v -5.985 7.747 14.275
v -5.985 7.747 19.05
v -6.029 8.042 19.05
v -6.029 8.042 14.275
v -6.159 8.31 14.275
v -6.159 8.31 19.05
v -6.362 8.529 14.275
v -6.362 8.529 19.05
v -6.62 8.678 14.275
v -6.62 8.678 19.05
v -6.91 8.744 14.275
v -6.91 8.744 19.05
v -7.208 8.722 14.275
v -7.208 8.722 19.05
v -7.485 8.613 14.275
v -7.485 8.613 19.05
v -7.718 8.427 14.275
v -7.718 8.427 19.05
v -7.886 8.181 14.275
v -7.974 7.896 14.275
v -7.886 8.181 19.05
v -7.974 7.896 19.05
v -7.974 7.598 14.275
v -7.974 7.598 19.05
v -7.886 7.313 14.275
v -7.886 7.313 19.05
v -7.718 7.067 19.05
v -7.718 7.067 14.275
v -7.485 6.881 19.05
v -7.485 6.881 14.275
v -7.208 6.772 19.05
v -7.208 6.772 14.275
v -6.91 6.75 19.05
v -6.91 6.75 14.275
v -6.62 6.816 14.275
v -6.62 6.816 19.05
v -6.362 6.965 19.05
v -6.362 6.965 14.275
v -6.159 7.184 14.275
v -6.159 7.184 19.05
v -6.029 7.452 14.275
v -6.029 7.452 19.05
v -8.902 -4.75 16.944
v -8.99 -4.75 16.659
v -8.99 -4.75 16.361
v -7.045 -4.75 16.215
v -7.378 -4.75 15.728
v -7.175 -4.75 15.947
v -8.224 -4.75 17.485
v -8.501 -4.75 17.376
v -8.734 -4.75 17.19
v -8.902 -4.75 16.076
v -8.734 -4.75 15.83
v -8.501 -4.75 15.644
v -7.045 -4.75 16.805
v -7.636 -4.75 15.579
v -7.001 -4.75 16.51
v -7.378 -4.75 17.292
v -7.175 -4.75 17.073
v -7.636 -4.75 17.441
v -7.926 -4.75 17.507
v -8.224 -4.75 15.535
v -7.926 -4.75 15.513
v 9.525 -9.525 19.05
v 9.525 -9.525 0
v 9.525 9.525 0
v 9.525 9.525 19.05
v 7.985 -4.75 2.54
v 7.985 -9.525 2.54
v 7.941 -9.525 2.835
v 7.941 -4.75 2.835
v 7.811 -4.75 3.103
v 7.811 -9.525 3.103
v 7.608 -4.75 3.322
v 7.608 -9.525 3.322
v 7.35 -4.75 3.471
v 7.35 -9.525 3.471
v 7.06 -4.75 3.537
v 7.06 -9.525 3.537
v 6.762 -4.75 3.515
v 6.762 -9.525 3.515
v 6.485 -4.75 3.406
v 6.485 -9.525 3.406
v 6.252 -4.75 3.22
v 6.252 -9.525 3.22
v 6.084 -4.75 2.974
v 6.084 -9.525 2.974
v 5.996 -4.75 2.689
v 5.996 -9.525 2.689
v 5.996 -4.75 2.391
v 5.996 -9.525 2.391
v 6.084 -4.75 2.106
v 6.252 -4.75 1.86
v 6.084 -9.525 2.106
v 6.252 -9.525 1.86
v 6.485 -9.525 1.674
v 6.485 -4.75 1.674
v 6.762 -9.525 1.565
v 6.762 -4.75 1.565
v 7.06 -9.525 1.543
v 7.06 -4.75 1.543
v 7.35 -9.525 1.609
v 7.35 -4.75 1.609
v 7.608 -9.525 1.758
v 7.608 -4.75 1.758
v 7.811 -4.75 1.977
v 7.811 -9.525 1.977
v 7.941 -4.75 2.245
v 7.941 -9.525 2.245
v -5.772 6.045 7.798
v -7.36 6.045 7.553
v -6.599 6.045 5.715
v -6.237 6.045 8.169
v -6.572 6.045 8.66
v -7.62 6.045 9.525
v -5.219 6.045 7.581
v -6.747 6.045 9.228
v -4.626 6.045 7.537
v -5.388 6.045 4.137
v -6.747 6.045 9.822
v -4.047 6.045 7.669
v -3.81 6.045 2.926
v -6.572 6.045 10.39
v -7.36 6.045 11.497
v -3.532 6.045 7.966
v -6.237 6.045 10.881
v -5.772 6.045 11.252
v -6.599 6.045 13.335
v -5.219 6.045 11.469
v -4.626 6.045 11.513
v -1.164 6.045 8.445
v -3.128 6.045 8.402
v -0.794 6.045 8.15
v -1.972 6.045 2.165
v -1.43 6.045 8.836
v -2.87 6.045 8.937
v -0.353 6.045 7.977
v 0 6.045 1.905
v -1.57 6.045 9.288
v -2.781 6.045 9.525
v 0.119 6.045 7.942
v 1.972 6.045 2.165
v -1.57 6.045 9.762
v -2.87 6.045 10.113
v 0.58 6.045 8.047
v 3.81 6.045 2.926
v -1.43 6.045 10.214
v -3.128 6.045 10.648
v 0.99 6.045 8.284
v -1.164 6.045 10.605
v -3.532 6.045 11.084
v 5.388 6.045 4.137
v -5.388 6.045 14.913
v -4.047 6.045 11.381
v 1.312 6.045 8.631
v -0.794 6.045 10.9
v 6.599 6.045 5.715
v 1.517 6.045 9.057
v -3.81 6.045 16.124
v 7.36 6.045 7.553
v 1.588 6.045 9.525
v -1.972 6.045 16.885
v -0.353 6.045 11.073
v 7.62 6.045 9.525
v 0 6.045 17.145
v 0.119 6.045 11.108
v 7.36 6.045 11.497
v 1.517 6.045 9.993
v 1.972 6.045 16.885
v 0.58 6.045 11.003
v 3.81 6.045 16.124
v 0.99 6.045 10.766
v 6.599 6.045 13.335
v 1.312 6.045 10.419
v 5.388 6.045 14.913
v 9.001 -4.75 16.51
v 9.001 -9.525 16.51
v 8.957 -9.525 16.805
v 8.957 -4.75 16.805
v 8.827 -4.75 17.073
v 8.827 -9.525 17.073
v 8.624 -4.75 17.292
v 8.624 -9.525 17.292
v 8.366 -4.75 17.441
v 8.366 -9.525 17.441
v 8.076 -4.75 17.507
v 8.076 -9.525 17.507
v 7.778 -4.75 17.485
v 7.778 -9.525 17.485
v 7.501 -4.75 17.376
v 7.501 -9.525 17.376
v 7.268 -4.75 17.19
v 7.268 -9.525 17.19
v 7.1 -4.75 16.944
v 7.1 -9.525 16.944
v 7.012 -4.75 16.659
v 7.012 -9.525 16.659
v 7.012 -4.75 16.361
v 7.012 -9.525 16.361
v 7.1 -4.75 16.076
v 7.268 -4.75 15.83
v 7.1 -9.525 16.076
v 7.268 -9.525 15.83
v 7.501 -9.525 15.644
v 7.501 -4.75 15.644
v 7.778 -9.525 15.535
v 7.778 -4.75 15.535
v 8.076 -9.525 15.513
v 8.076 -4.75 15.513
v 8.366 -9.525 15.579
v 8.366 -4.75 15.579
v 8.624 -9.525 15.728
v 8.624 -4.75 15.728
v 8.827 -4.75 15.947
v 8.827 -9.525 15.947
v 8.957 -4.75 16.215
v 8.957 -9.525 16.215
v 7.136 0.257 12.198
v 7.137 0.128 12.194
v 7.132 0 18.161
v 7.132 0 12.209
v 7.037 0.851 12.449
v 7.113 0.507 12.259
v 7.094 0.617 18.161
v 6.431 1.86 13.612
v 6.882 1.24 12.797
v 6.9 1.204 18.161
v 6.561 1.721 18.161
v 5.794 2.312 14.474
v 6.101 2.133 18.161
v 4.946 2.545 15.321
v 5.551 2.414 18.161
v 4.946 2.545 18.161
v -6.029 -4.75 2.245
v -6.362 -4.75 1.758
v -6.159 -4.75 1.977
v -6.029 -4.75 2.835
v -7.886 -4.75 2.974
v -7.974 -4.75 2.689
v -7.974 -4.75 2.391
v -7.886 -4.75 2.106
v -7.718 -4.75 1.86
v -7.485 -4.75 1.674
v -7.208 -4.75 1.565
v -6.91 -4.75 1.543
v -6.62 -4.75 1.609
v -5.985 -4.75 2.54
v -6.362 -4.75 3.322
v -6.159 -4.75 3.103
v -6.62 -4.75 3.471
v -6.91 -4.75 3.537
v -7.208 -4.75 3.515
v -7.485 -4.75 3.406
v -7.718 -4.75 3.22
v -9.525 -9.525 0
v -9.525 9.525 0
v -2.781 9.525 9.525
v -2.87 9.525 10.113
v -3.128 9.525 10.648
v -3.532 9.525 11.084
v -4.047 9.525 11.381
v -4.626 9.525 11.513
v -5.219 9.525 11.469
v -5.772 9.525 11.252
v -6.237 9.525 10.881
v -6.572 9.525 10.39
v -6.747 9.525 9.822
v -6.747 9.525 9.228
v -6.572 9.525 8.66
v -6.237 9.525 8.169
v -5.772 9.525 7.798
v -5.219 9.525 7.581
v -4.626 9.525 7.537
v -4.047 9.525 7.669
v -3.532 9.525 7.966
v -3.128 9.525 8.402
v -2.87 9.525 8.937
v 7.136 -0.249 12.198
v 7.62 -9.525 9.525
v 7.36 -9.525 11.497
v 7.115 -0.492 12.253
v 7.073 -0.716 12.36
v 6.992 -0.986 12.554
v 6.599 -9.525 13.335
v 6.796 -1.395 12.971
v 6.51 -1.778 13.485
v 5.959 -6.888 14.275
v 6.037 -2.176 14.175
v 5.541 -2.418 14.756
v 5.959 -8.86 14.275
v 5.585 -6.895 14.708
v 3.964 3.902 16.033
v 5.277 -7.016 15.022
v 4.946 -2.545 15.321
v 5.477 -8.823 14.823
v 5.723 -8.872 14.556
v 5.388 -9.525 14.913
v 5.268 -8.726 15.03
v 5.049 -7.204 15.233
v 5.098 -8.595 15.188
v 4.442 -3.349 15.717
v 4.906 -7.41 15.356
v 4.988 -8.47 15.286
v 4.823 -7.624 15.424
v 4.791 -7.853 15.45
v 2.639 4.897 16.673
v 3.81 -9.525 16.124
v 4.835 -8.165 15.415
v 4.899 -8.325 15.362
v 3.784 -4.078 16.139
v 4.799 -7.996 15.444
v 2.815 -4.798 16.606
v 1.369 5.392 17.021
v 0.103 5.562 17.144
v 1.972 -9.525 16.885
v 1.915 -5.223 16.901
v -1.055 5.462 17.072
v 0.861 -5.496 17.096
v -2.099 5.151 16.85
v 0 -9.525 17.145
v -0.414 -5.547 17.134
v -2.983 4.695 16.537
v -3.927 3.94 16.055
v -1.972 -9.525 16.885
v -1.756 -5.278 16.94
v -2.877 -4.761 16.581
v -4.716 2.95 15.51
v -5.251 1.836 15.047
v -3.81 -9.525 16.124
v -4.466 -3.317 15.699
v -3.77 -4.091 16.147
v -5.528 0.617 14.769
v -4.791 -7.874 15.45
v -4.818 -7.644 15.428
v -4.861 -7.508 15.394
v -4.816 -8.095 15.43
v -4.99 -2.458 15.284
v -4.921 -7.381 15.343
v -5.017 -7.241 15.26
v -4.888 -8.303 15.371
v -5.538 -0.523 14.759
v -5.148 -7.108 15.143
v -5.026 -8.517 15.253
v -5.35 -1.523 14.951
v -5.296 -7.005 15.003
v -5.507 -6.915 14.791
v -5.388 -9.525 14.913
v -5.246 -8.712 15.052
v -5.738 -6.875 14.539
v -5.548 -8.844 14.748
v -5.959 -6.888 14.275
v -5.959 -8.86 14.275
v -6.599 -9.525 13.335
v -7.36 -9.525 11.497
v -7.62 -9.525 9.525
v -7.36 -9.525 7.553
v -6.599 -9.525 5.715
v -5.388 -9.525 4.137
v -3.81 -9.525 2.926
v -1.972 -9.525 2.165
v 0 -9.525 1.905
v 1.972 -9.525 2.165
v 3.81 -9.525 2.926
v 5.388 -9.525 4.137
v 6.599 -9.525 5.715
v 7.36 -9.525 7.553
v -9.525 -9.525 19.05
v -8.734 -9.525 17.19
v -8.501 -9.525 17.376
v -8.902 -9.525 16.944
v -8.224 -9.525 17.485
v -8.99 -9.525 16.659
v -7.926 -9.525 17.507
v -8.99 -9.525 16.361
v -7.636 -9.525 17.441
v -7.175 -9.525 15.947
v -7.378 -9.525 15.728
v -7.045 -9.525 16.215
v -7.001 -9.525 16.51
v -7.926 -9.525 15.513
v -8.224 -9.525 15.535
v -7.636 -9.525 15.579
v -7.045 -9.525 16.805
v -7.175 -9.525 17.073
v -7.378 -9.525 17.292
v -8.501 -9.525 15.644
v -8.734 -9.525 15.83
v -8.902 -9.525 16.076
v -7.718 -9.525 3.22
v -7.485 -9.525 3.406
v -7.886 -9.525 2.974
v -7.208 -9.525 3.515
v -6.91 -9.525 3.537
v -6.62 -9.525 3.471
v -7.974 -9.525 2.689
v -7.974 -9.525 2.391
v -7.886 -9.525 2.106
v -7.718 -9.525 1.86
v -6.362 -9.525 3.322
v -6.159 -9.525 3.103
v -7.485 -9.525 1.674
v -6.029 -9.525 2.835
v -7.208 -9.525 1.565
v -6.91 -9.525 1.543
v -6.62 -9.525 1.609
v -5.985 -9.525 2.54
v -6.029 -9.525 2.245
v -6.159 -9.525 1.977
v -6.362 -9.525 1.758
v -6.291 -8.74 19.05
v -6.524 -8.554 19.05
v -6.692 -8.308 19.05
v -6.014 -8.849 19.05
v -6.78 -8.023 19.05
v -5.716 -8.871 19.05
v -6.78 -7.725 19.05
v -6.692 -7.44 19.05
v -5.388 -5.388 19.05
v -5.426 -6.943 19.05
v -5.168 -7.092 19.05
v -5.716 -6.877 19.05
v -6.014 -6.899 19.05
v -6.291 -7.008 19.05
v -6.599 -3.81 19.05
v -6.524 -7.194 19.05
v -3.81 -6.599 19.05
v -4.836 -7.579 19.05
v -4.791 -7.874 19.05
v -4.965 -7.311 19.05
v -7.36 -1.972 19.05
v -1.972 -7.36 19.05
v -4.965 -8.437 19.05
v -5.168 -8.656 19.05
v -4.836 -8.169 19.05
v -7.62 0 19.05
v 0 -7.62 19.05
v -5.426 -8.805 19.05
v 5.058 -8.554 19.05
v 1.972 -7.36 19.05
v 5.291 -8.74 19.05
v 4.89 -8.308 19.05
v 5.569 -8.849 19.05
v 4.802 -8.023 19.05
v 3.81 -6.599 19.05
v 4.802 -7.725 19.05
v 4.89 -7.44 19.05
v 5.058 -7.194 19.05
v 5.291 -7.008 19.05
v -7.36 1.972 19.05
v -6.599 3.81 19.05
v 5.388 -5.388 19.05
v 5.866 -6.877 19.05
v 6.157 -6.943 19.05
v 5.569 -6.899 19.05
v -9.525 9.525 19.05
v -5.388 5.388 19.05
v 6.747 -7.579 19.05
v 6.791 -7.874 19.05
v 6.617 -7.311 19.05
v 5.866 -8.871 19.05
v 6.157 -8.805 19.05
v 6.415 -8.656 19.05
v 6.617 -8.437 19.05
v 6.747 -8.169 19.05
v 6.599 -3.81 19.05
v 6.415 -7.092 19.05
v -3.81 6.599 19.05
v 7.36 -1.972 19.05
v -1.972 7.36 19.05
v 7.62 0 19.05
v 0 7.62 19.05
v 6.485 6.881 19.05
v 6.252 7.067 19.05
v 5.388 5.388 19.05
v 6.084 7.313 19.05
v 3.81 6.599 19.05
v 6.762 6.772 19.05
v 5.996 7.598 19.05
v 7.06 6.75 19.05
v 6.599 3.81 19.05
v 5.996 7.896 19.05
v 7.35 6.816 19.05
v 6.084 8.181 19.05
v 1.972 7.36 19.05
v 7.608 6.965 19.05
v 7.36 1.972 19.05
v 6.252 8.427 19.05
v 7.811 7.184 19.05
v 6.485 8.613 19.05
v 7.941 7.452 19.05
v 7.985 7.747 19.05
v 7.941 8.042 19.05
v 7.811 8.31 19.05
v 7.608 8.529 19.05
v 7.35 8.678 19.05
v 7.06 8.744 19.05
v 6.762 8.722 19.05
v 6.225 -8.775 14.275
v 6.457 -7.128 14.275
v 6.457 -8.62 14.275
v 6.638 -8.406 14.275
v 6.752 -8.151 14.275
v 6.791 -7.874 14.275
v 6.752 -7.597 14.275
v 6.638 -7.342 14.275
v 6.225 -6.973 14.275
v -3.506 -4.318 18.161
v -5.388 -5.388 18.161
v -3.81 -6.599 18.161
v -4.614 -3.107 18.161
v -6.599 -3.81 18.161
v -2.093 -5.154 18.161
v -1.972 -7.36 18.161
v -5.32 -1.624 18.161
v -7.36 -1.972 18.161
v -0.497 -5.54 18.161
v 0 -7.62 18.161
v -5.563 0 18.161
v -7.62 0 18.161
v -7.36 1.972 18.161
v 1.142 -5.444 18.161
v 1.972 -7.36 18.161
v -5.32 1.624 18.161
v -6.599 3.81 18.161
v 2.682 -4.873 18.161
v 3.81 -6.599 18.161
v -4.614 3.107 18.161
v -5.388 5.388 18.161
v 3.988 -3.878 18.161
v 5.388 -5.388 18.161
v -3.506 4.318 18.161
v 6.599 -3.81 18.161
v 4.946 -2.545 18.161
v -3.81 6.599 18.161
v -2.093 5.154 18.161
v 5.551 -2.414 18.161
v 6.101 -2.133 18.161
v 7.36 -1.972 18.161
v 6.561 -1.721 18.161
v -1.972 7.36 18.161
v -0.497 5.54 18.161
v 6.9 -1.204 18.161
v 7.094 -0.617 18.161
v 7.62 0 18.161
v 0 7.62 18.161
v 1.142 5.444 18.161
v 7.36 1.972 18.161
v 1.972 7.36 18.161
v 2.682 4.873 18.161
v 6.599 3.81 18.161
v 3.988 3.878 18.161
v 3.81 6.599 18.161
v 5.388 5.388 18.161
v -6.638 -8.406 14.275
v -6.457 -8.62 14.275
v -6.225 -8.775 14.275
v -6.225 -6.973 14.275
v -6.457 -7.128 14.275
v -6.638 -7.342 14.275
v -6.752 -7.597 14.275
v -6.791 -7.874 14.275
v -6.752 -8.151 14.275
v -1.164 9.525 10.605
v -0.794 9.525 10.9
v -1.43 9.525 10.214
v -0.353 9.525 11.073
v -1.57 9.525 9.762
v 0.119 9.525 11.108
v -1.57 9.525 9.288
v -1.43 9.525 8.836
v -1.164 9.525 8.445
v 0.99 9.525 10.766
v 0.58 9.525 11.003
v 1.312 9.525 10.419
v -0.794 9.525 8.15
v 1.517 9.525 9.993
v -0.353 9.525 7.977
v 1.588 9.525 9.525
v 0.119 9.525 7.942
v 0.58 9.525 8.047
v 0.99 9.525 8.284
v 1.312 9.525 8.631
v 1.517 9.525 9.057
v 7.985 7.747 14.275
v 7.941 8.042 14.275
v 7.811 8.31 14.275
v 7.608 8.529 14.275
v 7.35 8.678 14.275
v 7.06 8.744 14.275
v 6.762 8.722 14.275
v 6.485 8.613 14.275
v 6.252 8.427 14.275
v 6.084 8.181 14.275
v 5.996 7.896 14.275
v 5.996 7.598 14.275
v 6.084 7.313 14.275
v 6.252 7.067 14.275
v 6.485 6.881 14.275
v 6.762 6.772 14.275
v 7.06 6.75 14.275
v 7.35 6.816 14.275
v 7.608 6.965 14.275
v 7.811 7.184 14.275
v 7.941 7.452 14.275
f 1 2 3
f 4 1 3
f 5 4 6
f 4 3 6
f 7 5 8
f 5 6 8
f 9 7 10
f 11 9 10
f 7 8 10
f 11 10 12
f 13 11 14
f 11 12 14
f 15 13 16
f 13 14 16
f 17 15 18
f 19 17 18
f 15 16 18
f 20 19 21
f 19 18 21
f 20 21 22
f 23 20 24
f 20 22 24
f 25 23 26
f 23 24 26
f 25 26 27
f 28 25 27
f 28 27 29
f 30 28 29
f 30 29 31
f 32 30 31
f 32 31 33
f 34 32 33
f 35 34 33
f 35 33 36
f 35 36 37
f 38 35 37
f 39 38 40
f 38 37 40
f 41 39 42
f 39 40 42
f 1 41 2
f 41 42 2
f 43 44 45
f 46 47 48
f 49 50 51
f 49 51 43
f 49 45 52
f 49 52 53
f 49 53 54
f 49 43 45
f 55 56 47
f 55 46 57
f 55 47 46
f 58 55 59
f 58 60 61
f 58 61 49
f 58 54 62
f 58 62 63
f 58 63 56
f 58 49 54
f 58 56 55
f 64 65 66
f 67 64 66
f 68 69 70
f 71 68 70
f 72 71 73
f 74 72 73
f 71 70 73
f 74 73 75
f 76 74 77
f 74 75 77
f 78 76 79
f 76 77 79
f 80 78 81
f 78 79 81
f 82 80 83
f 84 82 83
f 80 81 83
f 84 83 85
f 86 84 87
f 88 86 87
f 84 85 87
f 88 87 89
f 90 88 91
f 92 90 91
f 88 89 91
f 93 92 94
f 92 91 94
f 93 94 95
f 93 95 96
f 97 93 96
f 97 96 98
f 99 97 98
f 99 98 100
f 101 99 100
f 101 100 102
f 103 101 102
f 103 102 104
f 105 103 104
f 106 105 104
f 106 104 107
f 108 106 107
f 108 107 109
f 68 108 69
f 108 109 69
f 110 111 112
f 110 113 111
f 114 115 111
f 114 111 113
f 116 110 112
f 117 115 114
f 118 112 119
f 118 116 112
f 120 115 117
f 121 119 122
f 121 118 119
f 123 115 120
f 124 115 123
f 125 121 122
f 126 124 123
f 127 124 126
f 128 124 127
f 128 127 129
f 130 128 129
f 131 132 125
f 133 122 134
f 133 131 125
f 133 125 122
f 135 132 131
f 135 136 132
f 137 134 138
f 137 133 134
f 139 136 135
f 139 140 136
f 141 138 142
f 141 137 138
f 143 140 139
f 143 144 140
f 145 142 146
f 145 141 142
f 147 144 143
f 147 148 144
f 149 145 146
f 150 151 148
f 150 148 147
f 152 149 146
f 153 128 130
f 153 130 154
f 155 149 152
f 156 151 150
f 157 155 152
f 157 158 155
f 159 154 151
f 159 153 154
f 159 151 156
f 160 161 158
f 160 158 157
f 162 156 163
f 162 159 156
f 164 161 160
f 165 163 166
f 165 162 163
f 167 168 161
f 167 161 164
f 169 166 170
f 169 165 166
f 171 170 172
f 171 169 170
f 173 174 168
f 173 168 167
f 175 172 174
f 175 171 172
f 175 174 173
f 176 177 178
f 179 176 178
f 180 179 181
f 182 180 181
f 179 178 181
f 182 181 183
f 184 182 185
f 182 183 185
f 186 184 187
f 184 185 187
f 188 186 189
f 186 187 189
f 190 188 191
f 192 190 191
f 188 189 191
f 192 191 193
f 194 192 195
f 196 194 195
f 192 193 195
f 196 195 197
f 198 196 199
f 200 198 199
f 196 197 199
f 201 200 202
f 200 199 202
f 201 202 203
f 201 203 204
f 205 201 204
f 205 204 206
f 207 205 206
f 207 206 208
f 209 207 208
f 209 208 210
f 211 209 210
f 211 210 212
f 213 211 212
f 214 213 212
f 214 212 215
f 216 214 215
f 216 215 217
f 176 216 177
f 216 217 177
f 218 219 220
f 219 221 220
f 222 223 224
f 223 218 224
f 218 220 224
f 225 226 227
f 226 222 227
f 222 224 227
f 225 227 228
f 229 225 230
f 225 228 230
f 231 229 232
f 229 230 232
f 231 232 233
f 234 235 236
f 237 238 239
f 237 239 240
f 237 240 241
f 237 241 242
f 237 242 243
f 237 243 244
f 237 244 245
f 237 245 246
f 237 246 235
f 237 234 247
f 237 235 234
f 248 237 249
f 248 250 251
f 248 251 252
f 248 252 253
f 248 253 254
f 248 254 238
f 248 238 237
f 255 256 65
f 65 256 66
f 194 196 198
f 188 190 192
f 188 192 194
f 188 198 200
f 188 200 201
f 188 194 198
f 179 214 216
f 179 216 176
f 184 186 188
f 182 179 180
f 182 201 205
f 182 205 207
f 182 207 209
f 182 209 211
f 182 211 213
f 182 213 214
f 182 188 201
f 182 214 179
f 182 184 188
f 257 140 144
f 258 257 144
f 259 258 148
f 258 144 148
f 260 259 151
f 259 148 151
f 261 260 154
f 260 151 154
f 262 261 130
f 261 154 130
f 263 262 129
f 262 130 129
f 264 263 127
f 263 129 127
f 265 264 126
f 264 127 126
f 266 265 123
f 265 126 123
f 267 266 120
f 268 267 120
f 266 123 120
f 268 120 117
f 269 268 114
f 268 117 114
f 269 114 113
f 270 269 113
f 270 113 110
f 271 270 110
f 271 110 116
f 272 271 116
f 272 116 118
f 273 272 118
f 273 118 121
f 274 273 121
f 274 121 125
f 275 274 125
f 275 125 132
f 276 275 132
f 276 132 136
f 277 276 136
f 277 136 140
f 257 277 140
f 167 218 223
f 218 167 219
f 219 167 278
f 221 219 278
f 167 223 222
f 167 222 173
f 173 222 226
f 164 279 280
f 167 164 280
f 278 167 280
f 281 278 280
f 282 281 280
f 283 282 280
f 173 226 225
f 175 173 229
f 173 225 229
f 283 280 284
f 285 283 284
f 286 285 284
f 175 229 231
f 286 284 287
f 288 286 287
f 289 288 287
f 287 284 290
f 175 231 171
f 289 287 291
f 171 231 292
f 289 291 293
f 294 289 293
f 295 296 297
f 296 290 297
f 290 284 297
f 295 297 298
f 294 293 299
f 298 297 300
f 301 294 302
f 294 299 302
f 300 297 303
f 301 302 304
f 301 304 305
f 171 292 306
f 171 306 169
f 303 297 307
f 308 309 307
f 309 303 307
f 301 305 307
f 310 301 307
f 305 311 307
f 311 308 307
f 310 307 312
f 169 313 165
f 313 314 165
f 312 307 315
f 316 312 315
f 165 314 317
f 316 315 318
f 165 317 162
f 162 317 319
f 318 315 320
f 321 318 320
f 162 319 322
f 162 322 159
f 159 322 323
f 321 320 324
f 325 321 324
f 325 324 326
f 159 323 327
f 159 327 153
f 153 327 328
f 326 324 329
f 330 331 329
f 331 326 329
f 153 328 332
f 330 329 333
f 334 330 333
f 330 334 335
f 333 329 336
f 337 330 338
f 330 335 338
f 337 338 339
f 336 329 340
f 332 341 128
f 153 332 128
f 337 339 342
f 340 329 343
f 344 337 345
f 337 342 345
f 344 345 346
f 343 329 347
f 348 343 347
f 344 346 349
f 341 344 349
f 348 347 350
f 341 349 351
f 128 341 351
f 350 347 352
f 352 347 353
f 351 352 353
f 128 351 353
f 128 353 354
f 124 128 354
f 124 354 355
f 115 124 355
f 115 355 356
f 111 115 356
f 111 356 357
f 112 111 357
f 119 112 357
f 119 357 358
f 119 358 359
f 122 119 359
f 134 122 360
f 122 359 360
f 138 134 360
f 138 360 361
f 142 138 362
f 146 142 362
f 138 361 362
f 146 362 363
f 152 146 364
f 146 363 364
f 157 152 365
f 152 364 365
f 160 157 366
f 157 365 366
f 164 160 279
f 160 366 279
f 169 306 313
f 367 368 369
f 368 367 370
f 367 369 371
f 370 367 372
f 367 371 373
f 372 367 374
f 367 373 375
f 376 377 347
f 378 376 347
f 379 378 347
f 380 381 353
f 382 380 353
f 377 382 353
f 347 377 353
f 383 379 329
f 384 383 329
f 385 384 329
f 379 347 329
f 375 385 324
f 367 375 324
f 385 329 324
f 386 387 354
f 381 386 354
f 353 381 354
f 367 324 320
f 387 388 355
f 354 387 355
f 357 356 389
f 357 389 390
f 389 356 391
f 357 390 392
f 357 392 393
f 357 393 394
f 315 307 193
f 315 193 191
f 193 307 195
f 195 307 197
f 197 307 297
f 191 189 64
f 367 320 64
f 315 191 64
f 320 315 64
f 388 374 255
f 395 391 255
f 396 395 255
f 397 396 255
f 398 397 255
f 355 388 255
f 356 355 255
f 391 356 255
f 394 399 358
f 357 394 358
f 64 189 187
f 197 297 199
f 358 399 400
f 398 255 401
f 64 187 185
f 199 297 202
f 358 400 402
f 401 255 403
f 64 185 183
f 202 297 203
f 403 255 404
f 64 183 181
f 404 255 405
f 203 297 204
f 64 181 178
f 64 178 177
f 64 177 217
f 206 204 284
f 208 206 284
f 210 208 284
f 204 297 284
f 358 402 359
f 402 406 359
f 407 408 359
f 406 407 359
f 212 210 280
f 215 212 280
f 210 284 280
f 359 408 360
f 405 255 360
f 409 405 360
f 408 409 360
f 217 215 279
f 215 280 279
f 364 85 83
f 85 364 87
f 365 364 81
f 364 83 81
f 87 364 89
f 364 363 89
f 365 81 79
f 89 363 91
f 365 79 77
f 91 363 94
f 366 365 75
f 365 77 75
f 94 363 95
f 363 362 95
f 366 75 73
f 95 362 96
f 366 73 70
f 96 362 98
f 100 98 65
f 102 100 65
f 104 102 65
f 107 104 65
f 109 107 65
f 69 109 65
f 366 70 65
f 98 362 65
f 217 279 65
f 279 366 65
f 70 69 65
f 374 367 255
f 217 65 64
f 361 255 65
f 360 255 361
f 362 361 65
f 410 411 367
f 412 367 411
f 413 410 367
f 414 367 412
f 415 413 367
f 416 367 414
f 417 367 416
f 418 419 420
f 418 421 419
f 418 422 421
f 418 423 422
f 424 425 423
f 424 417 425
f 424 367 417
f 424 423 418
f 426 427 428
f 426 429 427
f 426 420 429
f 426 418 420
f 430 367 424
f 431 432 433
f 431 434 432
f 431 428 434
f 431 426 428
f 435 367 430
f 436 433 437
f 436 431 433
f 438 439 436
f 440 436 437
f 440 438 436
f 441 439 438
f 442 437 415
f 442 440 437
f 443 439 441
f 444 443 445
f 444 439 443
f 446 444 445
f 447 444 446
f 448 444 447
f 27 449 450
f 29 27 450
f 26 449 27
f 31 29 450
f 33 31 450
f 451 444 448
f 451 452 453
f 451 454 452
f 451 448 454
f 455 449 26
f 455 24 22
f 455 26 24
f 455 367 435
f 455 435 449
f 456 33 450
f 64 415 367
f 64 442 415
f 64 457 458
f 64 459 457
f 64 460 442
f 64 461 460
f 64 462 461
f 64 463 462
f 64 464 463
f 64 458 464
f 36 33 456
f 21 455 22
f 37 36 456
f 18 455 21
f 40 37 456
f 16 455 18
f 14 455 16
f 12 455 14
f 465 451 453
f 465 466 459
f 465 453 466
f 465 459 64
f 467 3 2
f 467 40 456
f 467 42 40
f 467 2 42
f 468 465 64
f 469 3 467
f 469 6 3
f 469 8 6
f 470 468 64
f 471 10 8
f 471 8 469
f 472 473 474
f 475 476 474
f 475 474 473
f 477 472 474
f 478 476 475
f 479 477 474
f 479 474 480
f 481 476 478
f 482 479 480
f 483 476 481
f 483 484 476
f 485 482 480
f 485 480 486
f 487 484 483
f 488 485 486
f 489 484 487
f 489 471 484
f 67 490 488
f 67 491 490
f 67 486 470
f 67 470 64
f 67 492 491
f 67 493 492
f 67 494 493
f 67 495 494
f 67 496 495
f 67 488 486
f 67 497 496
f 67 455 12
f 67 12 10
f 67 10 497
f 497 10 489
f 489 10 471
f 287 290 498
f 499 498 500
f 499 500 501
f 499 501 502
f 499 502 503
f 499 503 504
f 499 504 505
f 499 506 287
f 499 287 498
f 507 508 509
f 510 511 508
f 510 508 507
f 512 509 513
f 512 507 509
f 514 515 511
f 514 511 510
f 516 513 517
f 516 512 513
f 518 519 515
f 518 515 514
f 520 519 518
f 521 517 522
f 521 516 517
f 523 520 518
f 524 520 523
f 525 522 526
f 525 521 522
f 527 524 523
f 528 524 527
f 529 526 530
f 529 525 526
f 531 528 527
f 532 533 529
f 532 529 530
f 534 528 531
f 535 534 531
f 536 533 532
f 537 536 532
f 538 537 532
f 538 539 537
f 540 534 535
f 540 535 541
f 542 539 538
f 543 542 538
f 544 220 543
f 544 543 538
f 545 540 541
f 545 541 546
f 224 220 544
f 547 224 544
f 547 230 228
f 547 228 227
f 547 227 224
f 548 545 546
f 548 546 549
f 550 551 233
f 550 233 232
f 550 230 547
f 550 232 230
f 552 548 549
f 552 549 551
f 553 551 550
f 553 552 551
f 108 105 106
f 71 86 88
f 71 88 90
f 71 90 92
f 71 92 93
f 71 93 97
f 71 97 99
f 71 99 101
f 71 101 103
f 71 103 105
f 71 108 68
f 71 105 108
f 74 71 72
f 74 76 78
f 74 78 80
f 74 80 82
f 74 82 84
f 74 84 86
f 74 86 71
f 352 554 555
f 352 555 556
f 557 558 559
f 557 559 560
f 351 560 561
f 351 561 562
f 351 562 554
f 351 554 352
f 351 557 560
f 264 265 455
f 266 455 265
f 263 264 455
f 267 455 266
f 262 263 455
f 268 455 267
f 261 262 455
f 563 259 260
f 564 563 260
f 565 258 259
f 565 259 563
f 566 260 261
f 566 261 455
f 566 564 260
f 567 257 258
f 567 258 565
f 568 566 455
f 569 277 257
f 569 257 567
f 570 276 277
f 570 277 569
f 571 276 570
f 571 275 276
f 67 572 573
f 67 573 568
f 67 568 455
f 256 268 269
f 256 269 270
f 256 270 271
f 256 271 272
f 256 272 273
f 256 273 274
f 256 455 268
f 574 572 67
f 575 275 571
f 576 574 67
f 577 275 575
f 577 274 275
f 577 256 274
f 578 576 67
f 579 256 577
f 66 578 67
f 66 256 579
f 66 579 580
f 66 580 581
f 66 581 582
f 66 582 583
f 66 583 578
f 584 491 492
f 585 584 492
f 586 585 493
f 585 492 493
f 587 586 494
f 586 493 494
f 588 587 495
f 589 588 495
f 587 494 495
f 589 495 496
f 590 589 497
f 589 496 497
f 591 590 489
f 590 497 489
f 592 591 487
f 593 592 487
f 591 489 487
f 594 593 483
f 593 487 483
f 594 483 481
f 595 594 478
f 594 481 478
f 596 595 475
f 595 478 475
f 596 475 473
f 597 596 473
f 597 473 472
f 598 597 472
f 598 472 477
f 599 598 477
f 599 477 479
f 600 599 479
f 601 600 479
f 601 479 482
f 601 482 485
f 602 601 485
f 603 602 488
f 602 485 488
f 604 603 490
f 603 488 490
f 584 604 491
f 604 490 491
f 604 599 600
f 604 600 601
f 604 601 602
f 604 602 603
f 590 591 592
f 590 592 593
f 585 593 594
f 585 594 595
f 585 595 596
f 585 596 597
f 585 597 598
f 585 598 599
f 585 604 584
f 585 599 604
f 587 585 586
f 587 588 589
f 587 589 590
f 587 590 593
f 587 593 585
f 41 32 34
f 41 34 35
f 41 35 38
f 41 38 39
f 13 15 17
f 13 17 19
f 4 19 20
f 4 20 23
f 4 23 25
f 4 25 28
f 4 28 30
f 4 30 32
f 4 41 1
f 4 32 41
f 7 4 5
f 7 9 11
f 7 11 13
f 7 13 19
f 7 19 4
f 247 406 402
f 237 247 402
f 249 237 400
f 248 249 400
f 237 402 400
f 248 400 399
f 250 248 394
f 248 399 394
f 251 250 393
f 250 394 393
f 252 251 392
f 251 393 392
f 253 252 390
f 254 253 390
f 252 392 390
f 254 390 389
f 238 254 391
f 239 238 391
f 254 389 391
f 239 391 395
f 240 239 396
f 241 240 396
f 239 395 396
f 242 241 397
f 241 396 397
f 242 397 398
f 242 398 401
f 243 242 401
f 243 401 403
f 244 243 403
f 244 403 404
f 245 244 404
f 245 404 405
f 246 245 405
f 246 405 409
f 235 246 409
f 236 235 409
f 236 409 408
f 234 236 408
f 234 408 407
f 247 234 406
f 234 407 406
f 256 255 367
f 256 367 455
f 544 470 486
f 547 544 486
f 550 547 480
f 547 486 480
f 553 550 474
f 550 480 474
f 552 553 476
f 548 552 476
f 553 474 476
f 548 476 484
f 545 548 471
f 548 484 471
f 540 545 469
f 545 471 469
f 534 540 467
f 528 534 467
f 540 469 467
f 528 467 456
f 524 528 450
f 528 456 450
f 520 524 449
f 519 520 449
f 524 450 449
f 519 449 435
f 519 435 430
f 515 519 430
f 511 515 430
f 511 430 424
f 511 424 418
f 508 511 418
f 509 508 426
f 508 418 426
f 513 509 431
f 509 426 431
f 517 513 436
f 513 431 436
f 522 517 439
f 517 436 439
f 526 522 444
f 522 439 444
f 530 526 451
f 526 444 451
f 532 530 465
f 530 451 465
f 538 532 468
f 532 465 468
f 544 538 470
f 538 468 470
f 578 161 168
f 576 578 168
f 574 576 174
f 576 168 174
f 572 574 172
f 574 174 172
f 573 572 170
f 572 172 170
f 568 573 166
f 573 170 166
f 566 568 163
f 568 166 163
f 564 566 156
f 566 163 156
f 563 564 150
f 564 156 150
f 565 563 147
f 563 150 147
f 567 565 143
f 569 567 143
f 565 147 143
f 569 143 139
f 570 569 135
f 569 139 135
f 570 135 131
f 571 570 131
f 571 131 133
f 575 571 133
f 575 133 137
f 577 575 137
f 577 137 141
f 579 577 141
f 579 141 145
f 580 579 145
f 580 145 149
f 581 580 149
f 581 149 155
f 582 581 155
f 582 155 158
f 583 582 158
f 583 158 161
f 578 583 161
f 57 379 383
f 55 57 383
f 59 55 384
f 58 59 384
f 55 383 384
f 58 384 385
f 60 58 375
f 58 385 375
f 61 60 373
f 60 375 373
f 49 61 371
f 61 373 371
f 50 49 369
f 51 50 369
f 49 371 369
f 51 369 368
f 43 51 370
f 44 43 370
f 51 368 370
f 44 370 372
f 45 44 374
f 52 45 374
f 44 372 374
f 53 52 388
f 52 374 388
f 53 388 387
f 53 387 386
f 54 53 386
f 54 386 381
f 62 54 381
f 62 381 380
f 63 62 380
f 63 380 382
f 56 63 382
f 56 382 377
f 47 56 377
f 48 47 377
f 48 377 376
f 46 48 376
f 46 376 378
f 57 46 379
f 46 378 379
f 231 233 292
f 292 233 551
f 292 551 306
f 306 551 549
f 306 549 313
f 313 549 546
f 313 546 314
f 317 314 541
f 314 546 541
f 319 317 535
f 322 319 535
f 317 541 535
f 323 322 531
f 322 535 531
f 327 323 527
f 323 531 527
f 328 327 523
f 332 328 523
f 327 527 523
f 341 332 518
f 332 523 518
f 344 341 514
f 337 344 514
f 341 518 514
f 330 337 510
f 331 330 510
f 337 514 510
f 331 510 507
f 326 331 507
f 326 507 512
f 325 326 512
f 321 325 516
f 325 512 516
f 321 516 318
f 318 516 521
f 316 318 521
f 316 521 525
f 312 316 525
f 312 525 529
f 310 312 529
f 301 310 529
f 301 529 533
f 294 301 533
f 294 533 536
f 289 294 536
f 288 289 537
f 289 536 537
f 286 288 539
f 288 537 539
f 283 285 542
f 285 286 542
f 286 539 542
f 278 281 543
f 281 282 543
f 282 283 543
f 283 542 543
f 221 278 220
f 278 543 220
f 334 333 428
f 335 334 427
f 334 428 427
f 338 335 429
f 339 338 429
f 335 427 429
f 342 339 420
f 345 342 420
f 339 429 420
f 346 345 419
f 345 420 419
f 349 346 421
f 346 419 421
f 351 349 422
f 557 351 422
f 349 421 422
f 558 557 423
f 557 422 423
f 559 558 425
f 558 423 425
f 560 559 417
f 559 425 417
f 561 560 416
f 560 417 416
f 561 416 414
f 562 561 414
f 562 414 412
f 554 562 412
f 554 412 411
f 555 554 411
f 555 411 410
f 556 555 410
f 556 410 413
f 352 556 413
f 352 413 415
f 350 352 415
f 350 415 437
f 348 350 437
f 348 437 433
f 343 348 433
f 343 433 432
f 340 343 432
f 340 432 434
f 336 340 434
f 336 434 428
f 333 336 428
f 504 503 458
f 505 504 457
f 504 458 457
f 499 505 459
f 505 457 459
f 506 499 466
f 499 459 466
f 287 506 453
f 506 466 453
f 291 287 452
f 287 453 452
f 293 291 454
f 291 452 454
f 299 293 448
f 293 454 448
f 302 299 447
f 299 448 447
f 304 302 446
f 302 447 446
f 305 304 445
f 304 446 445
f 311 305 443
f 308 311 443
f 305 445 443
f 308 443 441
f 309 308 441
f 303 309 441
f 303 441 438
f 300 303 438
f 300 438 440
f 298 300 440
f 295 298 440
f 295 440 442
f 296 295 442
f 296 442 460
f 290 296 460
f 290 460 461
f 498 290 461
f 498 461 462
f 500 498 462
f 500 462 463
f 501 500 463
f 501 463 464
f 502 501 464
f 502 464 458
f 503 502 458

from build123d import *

# Parameters (mm, degrees)
F0_W      = 19.05
F0_H      = 19.05
F1_DEPTH  = 19.05
F2_R      = 7.62
F3_DEPTH  = 0.889
F4_R      = 0.999998
F5_DEPTH  = 4.7752
F6_R      = 7.62
F7_DEPTH  = 15.5702
F9_DEPTH  = 6.8573073039
F10_R     = 1.5875
F10_R_2   = 1.9939
F11_DEPTH = 3.4808
F12_R     = 0.999998
F13_DEPTH = 4.7752


with BuildPart() as f1:
    # F0 (on Top) → F1 (new body)
    with BuildSketch(Plane.XY):
        Rectangle(F0_W, F0_H)
    extrude(amount=F1_DEPTH)

    # F2 (on face) → F3 (cut)
    with BuildSketch(Plane.XY.offset(19.05)):
        Circle(F2_R)
        with BuildLine():
            ThreePointArc((4.9464736177, -2.544585921), (-5.5626, 0), (4.9464736177, 2.544585921))
            ThreePointArc((4.9464736177, 2.544585921), (6.5611449159, 1.7206267132), (7.1316849154, 0))
            ThreePointArc((7.1316849154, 0), (6.5611449159, -1.7206267132), (4.9464736177, -2.544585921))
        make_face(mode=Mode.SUBTRACT)
    extrude(amount=-F3_DEPTH, mode=Mode.SUBTRACT)

    # F4 (on face) → F5 (cut)
    with BuildSketch(Plane.XY.offset(19.05)):
        with Locations((-5.7912, -7.874)):
            Circle(F4_R)
        with Locations((5.7912, -7.874)):
            Circle(F4_R)
        with Locations((6.985, 7.747)):
            Circle(F4_R)
        with Locations((-6.985, 7.747)):
            Circle(F4_R)
    extrude(amount=-F5_DEPTH, mode=Mode.SUBTRACT)

    # F6 (on face) → F7 (cut)
    with BuildSketch(Plane.XZ.offset(9.525)):
        with Locations((0, 9.525)):
            Circle(F6_R)
    extrude(amount=-F7_DEPTH, mode=Mode.SUBTRACT)

    # F8 (on face) → F9 (cut, through all)
    with BuildSketch(Plane.XY.offset(19.05)):
        with BuildLine():
            ThreePointArc((4.9464736177, 2.544585921), (-5.5626, 0), (4.9464736177, -2.544585921))
            ThreePointArc((4.9464736177, -2.544585921), (6.5611449159, -1.7206267132), (7.1316849154, 0))
            ThreePointArc((7.1316849154, 0), (6.5611449159, 1.7206267132), (4.9464736177, 2.544585921))
        make_face()
    extrude(amount=-F9_DEPTH, mode=Mode.SUBTRACT)

    # F10 (on face) → F11 (cut, through all)
    with BuildSketch(Plane.XZ.offset(-6.0452)):
        with Locations((0, 9.525)):
            Circle(F10_R)
        with Locations((-4.7752, 9.525)):
            Circle(F10_R_2)
    extrude(amount=-F11_DEPTH, mode=Mode.SUBTRACT)

    # F12 (on face) → F13 (cut)
    with BuildSketch(Plane.XZ.offset(9.525)):
        with Locations((-8.001, 16.51)):
            Circle(F12_R)
        with Locations((8.001, 16.51)):
            Circle(F12_R)
        with Locations((-6.985, 2.54)):
            Circle(F12_R)
        with Locations((6.985, 2.54)):
            Circle(F12_R)
    extrude(amount=-F13_DEPTH, mode=Mode.SUBTRACT)


solid = f1.part
